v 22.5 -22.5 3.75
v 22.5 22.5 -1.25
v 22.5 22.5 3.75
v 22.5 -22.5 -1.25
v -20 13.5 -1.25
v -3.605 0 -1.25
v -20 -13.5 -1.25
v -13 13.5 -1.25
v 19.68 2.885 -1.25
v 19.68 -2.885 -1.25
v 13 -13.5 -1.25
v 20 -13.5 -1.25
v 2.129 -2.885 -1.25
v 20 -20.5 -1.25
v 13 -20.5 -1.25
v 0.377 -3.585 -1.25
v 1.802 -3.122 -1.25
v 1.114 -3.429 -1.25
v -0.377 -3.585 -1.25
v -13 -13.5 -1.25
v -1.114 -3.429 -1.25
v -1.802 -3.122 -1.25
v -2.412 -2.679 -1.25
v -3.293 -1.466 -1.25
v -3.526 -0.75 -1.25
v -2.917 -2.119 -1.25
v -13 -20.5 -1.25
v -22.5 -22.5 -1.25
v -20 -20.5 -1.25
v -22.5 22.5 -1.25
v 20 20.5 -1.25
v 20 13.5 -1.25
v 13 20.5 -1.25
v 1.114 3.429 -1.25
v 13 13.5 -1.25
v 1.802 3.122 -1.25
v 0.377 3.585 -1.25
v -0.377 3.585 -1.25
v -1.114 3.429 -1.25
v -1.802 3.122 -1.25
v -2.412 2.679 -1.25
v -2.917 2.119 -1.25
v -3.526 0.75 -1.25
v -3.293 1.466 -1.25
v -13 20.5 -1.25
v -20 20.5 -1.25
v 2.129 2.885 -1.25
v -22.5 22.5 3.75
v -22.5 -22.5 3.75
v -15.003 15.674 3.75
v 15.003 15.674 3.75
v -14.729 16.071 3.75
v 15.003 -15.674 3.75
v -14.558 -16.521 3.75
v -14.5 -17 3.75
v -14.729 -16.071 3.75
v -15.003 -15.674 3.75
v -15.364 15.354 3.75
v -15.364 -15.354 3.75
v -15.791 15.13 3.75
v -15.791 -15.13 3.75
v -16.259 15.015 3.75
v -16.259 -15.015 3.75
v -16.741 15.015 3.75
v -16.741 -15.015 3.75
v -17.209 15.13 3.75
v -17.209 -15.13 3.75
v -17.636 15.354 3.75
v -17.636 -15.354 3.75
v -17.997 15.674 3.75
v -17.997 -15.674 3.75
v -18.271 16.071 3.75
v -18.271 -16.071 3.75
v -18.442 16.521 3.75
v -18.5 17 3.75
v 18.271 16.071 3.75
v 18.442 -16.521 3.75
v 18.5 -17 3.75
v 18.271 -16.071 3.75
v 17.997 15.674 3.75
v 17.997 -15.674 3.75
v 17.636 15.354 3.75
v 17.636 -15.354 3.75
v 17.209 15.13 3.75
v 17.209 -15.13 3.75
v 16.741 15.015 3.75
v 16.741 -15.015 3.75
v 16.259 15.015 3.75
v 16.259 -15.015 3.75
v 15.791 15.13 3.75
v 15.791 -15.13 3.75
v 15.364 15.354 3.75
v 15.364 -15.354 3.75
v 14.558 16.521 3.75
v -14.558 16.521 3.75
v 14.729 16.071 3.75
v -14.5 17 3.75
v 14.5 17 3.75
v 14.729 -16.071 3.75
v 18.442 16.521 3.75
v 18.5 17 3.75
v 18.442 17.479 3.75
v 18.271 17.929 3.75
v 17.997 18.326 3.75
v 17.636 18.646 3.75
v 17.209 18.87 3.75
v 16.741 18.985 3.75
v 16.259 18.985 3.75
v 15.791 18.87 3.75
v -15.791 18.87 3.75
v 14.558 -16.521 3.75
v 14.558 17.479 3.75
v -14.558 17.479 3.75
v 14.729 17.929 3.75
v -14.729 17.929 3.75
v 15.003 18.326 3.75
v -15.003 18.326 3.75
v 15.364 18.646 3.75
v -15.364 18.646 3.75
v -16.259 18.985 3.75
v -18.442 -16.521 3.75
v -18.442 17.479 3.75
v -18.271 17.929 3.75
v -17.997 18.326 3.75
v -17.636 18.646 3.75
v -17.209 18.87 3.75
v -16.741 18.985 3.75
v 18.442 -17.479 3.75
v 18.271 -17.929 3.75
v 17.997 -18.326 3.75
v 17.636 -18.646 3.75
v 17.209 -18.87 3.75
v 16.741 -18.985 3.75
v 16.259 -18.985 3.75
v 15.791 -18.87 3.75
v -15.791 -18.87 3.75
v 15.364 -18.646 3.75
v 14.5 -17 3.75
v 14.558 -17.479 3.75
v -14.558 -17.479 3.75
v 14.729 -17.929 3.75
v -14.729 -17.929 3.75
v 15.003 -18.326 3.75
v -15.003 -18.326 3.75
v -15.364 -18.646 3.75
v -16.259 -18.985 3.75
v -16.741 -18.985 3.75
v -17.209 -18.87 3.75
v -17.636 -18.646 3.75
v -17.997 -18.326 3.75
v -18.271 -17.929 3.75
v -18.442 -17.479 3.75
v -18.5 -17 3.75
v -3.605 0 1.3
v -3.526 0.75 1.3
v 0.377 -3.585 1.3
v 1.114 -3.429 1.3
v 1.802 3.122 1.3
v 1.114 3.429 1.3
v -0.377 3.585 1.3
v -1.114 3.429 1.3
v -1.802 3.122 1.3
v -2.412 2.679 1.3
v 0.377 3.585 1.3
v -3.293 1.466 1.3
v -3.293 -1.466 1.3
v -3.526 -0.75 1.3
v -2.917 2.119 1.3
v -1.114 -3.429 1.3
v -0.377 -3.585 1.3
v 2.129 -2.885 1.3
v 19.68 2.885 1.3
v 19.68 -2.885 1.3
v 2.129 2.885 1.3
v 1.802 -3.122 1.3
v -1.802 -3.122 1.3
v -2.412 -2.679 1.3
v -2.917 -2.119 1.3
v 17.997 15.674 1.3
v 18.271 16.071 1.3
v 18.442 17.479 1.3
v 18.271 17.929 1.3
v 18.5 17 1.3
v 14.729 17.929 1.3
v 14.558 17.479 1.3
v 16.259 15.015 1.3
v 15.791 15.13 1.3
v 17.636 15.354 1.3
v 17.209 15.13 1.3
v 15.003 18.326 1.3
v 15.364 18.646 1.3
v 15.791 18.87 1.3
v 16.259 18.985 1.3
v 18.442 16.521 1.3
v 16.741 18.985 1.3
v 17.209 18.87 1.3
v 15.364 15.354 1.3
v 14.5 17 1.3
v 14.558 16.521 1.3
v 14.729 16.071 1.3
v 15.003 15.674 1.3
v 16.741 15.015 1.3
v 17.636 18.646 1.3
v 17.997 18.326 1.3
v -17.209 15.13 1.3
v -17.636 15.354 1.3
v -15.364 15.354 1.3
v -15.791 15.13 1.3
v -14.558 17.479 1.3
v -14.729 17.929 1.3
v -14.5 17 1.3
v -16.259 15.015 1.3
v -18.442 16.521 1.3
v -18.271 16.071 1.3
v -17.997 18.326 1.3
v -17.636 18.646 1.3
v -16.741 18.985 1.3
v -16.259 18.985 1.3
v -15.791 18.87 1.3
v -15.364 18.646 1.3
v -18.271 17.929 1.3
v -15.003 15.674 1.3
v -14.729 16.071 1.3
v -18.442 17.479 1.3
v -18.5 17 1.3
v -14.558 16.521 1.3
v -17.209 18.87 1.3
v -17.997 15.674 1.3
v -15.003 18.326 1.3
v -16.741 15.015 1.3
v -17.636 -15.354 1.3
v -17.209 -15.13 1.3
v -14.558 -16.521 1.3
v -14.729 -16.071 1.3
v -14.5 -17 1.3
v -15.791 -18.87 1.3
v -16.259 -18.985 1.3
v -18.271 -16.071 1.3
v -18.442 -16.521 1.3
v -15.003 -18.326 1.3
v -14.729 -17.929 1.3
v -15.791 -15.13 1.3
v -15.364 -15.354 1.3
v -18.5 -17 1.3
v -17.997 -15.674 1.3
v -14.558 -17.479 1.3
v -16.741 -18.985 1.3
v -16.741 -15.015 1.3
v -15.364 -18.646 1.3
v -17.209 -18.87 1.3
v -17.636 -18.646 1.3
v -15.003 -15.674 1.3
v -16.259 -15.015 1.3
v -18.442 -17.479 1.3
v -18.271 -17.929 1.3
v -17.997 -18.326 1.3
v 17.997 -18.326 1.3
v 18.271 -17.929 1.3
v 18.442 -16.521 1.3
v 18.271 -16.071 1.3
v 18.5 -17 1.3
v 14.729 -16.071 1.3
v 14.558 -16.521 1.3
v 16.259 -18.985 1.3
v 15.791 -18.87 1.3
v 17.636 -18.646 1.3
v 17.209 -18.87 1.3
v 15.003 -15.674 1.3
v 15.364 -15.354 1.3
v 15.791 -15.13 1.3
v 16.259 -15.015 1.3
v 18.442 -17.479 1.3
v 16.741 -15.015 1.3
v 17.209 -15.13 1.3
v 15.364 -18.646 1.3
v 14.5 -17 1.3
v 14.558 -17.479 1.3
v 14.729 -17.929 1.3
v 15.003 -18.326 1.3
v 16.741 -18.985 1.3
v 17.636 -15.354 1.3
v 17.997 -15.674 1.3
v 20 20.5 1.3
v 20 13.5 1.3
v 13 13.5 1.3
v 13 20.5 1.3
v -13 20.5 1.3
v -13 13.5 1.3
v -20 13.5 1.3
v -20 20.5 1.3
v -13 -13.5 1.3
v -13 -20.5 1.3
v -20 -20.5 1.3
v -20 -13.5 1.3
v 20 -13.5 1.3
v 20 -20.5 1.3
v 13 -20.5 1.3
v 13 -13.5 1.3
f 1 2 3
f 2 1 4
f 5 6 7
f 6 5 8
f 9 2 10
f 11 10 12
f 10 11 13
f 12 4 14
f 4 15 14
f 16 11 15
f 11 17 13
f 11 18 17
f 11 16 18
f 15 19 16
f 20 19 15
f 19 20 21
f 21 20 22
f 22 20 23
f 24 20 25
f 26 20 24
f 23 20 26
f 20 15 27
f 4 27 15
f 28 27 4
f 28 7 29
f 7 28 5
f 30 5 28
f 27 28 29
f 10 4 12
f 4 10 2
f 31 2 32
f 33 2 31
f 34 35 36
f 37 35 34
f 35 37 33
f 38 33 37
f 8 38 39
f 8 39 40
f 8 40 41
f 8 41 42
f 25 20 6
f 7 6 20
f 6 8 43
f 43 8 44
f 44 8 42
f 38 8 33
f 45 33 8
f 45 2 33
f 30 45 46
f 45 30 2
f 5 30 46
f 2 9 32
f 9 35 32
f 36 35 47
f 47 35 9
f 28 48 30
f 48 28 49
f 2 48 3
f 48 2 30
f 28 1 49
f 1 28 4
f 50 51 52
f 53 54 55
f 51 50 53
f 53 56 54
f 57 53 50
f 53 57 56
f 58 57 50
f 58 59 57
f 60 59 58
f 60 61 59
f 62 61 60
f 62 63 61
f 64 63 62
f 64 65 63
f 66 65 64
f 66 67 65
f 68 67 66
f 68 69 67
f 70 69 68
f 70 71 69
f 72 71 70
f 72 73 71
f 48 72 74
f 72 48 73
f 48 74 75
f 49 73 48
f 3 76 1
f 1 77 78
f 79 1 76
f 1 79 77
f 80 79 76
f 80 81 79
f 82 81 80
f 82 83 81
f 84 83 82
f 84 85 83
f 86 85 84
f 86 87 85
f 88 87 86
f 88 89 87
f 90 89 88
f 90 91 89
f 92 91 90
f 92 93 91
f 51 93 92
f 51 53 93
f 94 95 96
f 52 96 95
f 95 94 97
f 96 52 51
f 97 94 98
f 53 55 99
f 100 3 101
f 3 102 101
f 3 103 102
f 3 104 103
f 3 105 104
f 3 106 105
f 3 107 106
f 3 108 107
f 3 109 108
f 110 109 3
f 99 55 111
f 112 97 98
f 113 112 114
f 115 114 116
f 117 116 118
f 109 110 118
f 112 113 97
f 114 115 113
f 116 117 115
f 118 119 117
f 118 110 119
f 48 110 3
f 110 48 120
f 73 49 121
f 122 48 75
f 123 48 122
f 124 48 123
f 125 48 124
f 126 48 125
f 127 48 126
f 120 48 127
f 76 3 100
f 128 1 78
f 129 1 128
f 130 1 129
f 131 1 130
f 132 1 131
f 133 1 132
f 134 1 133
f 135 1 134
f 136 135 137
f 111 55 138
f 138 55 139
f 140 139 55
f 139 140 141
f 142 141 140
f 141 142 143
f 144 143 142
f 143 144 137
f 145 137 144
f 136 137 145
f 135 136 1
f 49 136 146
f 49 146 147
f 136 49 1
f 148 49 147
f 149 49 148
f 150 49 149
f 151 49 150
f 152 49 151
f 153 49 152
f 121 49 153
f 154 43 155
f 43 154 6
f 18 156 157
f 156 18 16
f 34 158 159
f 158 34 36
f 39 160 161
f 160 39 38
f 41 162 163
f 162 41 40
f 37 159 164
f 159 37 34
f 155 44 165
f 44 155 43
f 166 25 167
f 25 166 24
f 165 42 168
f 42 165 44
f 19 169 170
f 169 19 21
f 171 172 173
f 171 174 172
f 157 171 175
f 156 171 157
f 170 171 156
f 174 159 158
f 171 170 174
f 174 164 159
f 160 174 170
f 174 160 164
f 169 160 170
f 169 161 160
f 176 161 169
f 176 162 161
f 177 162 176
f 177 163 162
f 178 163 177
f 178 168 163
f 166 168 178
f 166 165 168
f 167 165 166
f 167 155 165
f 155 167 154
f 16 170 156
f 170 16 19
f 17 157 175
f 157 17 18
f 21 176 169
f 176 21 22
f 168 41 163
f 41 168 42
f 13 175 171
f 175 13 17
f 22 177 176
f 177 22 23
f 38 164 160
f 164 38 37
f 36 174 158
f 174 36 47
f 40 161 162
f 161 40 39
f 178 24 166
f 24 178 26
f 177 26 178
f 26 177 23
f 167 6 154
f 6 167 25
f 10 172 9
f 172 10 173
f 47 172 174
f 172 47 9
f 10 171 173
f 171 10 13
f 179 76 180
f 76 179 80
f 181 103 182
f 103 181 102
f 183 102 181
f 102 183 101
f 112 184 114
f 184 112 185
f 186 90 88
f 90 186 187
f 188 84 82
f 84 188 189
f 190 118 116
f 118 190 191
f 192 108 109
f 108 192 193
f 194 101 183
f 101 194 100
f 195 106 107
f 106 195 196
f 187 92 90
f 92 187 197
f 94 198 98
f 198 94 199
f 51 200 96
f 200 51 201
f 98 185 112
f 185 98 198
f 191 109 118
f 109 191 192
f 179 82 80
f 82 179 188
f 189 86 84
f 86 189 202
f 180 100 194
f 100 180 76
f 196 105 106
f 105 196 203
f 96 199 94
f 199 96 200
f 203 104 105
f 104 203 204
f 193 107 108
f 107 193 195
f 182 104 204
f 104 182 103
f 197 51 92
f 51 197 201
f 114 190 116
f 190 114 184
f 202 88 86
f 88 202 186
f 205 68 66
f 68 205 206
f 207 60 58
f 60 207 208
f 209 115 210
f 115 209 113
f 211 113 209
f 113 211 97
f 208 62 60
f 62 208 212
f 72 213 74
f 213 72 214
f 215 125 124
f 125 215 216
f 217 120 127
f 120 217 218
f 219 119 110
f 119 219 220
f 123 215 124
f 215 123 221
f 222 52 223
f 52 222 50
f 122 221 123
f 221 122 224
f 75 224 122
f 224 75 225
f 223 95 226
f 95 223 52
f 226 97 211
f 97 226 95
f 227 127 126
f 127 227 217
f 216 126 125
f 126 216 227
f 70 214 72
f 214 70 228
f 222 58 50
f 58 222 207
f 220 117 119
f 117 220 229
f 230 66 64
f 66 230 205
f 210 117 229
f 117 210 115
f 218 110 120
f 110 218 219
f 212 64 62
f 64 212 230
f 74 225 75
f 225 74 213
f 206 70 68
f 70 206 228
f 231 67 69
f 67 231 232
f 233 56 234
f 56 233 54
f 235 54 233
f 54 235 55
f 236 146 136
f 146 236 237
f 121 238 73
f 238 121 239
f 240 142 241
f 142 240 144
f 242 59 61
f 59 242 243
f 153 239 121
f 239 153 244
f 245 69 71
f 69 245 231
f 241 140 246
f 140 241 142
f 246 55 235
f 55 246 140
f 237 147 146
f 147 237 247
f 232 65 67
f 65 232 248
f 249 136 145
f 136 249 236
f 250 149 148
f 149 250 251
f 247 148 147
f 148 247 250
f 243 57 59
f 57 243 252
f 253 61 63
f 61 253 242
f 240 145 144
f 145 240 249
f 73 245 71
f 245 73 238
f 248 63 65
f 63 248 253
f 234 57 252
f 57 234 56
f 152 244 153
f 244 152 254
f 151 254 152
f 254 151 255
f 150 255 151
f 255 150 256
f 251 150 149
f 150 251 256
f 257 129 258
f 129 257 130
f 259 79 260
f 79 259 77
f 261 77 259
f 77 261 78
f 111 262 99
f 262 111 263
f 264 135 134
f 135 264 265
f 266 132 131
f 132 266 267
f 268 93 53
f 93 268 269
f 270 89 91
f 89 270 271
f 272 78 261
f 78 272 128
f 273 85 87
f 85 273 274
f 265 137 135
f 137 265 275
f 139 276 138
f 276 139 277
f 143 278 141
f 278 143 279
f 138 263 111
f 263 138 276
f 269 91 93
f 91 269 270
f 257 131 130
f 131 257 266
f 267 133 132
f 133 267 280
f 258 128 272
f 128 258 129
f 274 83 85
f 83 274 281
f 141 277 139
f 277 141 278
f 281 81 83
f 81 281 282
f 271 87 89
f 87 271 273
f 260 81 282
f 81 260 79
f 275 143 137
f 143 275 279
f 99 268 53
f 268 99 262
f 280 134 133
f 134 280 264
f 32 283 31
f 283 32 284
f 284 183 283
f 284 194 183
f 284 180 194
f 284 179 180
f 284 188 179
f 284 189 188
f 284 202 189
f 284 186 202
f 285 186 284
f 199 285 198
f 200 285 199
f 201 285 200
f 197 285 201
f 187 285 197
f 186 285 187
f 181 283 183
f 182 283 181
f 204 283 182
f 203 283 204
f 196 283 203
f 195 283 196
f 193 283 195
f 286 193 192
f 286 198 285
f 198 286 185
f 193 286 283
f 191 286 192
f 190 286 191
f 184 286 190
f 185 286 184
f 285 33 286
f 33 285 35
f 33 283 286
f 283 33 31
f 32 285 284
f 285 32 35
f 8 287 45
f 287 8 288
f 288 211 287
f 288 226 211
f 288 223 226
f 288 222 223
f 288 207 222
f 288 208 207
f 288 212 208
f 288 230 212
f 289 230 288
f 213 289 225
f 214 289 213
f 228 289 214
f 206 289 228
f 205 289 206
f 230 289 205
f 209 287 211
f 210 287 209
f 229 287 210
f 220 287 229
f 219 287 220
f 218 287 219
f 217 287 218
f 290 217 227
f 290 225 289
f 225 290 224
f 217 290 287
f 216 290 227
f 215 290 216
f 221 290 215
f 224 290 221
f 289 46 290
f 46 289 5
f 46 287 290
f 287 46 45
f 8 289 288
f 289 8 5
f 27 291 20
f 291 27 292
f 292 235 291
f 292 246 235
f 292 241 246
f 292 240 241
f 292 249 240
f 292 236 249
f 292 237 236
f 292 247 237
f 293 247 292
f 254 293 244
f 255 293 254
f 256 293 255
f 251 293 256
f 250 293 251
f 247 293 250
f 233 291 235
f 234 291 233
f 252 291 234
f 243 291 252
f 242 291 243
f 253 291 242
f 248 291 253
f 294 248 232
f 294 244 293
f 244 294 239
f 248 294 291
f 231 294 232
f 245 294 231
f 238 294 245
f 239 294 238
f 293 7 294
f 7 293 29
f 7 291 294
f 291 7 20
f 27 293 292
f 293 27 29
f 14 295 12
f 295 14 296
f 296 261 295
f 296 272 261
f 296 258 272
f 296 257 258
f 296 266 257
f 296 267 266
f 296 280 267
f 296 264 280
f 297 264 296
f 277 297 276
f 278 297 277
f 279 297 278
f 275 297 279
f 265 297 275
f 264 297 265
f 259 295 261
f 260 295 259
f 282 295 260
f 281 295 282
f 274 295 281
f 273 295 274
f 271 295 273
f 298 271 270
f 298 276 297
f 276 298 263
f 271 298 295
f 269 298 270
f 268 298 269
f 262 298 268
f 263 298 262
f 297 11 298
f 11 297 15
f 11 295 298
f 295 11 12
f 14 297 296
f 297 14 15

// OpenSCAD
HEIGHT = 2.5;
M = 0.1;

BOLT_SIZE = 4;
BOLT_SIZE_R = BOLT_SIZE / 2;
NUT_SIZE = 7;
NUT_R = NUT_SIZE/2;

$fs = 0.5;

module servo_arm() {
    h = HEIGHT + M;
    
    SERVO_ARM_SHAFT_DIAMETER = 7.21;
    SERVO_ARM_SHAFT_R = SERVO_ARM_SHAFT_DIAMETER/2;

    cylinder(h, SERVO_ARM_SHAFT_R, SERVO_ARM_SHAFT_R, center=true);

    ARM_WIDTH = 5.77;

    translate ([0, -ARM_WIDTH/2, -h/2]) {
        cube([19.68, 5.77, h]);
    }
}



difference() {
    group() {
        cube([45, 45, HEIGHT], center=true);
        translate([0, 0, HEIGHT]) {
            cube([45, 45, HEIGHT], center=true);
        }
    }
    servo_arm();
    translate([45/2 - 6, 42/2 - 4, 0]) {
        cube([NUT_SIZE, NUT_SIZE, HEIGHT + M], center=true);
    }
    translate([-45/2 + 6, 42/2 - 4, 0]) {
        cube([NUT_SIZE, NUT_SIZE, HEIGHT + M], center=true);
    }
    translate([-45/2 + 6, -42/2 + 4, 0]) {
        cube([NUT_SIZE, NUT_SIZE, HEIGHT + M], center=true);
    }
    translate([45/2 - 6, -42/2 + 4, 0]) {
        cube([NUT_SIZE, NUT_SIZE, HEIGHT + M], center=true);
    }
    translate([0, 0, HEIGHT]) {
        translate([45/2 - 6, 42/2 - 4, 0]) {
            cylinder(HEIGHT + M, BOLT_SIZE_R, BOLT_SIZE_R, center=true);
        }
        translate([-45/2 + 6, 42/2 - 4, 0]) {
            cylinder(HEIGHT + M, BOLT_SIZE_R, BOLT_SIZE_R, center=true);
        }
        translate([-45/2 + 6, -42/2 + 4, 0]) {
            cylinder(HEIGHT + M, BOLT_SIZE_R, BOLT_SIZE_R, center=true);
        }
        translate([45/2 - 6, -42/2 + 4, 0]) {
            cylinder(HEIGHT + M, BOLT_SIZE_R, BOLT_SIZE_R, center=true);
        }
    }
}

//servo_arm();
